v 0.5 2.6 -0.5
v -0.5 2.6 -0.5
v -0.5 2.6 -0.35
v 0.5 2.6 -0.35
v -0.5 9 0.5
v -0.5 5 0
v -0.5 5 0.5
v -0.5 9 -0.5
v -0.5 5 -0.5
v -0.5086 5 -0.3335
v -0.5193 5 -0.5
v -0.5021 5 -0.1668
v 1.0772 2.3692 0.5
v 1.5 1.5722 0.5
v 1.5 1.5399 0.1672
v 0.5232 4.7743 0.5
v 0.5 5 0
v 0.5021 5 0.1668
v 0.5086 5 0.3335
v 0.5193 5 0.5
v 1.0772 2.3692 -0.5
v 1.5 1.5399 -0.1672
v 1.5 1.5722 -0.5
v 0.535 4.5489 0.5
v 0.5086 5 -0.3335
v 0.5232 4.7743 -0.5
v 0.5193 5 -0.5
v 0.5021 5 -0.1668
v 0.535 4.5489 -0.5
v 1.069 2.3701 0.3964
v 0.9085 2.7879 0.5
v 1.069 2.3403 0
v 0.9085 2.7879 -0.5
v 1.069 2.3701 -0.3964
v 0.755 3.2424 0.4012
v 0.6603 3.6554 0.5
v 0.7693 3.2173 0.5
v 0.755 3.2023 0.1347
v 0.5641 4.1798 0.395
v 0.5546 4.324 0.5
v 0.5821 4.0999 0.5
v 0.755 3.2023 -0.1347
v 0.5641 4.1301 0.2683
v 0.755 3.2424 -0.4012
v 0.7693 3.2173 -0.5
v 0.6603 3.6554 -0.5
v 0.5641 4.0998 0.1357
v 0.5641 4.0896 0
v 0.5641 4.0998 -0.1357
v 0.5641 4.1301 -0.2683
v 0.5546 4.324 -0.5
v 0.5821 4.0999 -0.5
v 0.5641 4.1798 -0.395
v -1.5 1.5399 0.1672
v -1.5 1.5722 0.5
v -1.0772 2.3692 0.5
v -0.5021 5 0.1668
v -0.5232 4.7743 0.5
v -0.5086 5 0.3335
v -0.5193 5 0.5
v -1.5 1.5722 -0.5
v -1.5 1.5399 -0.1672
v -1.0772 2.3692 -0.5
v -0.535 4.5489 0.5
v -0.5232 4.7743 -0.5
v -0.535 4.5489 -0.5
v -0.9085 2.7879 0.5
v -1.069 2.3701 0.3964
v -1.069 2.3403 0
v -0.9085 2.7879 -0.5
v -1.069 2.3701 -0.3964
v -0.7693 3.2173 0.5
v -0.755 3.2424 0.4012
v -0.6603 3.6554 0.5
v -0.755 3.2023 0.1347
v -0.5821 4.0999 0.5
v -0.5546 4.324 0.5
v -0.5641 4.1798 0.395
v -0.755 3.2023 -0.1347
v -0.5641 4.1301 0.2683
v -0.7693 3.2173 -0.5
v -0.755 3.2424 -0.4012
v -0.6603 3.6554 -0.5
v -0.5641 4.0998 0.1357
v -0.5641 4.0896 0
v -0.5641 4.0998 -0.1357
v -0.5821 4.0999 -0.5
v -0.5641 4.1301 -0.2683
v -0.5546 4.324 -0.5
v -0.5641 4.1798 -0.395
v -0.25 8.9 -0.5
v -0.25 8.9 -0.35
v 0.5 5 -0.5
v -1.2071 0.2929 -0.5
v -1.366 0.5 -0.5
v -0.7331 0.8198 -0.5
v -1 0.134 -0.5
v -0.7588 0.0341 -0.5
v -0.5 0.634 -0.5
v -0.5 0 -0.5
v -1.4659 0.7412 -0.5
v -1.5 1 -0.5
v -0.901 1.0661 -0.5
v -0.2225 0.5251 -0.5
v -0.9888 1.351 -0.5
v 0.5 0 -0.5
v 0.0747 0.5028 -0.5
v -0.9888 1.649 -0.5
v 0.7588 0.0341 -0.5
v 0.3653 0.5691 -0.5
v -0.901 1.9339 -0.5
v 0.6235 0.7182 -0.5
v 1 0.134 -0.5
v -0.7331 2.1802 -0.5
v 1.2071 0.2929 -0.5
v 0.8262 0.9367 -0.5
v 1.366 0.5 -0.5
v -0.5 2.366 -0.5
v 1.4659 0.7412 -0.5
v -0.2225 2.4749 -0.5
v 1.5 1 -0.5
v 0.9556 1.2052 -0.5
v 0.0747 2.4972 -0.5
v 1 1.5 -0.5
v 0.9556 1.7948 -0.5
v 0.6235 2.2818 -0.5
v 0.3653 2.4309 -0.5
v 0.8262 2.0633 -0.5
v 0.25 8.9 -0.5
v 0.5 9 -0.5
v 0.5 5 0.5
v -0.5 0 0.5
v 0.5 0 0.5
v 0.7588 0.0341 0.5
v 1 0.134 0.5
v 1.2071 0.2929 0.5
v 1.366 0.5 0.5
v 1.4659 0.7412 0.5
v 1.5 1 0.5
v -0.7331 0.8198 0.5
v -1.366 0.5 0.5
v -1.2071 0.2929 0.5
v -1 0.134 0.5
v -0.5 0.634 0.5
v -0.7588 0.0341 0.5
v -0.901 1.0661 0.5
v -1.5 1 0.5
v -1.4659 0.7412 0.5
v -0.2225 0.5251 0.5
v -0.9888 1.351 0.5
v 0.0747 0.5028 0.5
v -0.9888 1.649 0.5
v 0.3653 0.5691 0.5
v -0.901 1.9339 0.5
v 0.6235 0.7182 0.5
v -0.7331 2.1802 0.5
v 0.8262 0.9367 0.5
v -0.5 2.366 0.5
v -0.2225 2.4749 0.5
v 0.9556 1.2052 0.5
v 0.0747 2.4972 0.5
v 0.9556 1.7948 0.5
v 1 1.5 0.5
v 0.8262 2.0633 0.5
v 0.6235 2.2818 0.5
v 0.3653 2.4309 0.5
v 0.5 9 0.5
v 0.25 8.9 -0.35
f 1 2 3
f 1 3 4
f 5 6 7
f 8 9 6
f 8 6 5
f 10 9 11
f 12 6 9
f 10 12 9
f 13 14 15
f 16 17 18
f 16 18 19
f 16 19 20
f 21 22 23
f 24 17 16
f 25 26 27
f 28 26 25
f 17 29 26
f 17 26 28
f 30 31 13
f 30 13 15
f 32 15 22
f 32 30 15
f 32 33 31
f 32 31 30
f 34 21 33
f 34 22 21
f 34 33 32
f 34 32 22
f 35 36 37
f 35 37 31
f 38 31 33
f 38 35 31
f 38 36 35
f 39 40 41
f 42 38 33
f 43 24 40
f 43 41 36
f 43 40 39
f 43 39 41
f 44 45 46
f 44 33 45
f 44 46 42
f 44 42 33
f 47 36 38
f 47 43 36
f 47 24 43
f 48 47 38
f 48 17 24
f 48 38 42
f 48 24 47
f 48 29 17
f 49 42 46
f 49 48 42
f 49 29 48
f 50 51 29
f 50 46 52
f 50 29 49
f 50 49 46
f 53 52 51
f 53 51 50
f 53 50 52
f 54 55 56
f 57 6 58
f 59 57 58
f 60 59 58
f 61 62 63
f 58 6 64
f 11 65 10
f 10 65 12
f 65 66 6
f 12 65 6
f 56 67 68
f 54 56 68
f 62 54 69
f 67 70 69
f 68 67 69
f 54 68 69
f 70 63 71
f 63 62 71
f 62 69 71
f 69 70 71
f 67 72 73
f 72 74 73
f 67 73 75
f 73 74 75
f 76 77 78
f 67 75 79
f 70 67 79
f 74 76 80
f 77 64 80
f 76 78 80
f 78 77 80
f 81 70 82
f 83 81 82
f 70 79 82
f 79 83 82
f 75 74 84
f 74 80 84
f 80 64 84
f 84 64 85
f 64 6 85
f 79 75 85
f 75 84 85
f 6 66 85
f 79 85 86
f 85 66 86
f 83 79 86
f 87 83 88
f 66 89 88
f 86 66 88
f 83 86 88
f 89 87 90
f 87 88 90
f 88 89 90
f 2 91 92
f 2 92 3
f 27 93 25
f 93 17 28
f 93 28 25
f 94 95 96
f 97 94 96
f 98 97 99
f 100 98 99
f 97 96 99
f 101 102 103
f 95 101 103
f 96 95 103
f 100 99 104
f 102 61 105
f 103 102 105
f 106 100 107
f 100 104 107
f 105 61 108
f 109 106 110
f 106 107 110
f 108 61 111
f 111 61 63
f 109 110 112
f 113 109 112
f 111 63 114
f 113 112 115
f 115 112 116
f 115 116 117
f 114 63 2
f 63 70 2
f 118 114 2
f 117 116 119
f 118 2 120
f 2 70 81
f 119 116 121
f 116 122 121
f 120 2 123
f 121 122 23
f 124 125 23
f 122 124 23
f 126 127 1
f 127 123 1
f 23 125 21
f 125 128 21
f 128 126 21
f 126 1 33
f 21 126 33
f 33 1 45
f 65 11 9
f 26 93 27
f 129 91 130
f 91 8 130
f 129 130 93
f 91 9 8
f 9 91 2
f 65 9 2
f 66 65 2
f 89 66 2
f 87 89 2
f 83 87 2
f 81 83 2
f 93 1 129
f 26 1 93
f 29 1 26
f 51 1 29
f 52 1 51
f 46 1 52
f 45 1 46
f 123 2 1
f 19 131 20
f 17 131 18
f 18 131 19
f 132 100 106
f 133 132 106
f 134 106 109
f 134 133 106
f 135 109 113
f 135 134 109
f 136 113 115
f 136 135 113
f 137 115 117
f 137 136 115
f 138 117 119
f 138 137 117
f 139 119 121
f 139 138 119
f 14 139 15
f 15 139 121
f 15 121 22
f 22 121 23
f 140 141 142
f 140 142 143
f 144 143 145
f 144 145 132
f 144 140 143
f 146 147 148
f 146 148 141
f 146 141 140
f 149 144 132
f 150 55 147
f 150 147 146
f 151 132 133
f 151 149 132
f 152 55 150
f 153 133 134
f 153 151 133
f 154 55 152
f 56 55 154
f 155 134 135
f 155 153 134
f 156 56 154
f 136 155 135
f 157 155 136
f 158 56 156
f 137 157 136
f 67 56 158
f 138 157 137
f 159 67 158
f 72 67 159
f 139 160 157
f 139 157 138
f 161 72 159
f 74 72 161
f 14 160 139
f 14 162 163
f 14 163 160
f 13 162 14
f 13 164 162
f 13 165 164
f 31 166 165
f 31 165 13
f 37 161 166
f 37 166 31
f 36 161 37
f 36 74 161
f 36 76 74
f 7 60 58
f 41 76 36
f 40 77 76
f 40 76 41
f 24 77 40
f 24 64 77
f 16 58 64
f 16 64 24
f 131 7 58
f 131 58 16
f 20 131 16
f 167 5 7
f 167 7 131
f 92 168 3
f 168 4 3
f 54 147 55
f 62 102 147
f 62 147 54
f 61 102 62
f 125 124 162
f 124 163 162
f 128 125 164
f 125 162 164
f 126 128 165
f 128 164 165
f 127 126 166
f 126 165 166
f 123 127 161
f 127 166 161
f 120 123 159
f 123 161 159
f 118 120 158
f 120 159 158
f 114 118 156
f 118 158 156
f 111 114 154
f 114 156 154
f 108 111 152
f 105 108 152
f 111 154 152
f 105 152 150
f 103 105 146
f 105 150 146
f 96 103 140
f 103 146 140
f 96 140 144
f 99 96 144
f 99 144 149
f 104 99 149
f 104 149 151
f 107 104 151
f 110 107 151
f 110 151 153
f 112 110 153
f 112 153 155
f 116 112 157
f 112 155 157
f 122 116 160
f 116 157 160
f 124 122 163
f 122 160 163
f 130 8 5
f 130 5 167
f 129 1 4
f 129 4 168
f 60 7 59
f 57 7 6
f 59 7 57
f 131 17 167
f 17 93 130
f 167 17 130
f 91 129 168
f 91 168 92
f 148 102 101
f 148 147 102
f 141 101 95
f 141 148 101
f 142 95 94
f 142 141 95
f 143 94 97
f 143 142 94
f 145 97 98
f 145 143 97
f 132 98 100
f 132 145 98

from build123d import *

# Parameters (mm, degrees)
BOX_W           = 3
BOX_H           = 9
BOX_DEPTH       = 1
SKETCH_R        = 1
POCKET_DEPTH    = 3
BOX001_W        = 2
BOX001_H        = 4
BOX001_DEPTH    = 2
POCKET001_DEPTH = 0.15
FILLET_R        = 1


with BuildPart() as part:
    # Box → Box (join)
    with BuildSketch(Plane(origin=(-1.5, 0, -0.5), x_dir=(1, 0, 0), z_dir=(0, 0, 1))):
        with Locations((1.5, 4.5)):
            Rectangle(BOX_W, BOX_H)
    extrude(amount=BOX_DEPTH)

    # Sketch → Pocket (cut, symmetric)
    with BuildSketch(Plane.XY):
        with Locations((0, 1.5)):
            Circle(SKETCH_R)
    extrude(amount=POCKET_DEPTH, both=True, mode=Mode.SUBTRACT)

    # Sphere → Sphere (revolve, cut)
    with BuildSketch(Plane(origin=(-7, 5, 0), x_dir=(0, 1, 0), z_dir=(0, 0, -1))):
        with BuildLine():
            ThreePointArc((0, -6.5), (6.5, 0), (0, 6.5))
            Line((0, 6.5), (0, -6.5))
        make_face()
    sphere = revolve(axis=Axis((-7, 5, 0), (1, 0, 0)), mode=Mode.SUBTRACT)

    # Mirrored: Sphere across YZ
    add(sphere.mirror(Plane.YZ), mode=Mode.SUBTRACT)

    # Box001 → Box001 (cut)
    with BuildSketch(Plane(origin=(0.5, 5, -1), x_dir=(1, 0, 0), z_dir=(0, 0, 1))):
        with Locations((1, 2)):
            Rectangle(BOX001_W, BOX001_H)
    box001 = extrude(amount=BOX001_DEPTH, mode=Mode.SUBTRACT)

    # Mirrored001: Box001 across YZ
    add(box001.mirror(Plane.YZ), mode=Mode.SUBTRACT)

    # Sketch001 (on Face4 of Mirrored001) → Pocket001 (cut, symmetric)
    with BuildSketch(Plane(origin=(0.5, 5, -0.5), x_dir=(1, 0, 0), z_dir=(0, 0, -1))):
        Polygon((-0.25, -3.9), (-0.75, -3.9), (-1, 2.4), (0, 2.4), align=None)
    extrude(amount=POCKET001_DEPTH, both=True, mode=Mode.SUBTRACT)

    # Fillet
    fillet_edges = [part.edges().sort_by_distance(p)[0] for p in [
        (-1.5, 0, 0),
        (1.5, 0, 0),
    ]]
    fillet(fillet_edges, radius=FILLET_R)


solid = part.part
